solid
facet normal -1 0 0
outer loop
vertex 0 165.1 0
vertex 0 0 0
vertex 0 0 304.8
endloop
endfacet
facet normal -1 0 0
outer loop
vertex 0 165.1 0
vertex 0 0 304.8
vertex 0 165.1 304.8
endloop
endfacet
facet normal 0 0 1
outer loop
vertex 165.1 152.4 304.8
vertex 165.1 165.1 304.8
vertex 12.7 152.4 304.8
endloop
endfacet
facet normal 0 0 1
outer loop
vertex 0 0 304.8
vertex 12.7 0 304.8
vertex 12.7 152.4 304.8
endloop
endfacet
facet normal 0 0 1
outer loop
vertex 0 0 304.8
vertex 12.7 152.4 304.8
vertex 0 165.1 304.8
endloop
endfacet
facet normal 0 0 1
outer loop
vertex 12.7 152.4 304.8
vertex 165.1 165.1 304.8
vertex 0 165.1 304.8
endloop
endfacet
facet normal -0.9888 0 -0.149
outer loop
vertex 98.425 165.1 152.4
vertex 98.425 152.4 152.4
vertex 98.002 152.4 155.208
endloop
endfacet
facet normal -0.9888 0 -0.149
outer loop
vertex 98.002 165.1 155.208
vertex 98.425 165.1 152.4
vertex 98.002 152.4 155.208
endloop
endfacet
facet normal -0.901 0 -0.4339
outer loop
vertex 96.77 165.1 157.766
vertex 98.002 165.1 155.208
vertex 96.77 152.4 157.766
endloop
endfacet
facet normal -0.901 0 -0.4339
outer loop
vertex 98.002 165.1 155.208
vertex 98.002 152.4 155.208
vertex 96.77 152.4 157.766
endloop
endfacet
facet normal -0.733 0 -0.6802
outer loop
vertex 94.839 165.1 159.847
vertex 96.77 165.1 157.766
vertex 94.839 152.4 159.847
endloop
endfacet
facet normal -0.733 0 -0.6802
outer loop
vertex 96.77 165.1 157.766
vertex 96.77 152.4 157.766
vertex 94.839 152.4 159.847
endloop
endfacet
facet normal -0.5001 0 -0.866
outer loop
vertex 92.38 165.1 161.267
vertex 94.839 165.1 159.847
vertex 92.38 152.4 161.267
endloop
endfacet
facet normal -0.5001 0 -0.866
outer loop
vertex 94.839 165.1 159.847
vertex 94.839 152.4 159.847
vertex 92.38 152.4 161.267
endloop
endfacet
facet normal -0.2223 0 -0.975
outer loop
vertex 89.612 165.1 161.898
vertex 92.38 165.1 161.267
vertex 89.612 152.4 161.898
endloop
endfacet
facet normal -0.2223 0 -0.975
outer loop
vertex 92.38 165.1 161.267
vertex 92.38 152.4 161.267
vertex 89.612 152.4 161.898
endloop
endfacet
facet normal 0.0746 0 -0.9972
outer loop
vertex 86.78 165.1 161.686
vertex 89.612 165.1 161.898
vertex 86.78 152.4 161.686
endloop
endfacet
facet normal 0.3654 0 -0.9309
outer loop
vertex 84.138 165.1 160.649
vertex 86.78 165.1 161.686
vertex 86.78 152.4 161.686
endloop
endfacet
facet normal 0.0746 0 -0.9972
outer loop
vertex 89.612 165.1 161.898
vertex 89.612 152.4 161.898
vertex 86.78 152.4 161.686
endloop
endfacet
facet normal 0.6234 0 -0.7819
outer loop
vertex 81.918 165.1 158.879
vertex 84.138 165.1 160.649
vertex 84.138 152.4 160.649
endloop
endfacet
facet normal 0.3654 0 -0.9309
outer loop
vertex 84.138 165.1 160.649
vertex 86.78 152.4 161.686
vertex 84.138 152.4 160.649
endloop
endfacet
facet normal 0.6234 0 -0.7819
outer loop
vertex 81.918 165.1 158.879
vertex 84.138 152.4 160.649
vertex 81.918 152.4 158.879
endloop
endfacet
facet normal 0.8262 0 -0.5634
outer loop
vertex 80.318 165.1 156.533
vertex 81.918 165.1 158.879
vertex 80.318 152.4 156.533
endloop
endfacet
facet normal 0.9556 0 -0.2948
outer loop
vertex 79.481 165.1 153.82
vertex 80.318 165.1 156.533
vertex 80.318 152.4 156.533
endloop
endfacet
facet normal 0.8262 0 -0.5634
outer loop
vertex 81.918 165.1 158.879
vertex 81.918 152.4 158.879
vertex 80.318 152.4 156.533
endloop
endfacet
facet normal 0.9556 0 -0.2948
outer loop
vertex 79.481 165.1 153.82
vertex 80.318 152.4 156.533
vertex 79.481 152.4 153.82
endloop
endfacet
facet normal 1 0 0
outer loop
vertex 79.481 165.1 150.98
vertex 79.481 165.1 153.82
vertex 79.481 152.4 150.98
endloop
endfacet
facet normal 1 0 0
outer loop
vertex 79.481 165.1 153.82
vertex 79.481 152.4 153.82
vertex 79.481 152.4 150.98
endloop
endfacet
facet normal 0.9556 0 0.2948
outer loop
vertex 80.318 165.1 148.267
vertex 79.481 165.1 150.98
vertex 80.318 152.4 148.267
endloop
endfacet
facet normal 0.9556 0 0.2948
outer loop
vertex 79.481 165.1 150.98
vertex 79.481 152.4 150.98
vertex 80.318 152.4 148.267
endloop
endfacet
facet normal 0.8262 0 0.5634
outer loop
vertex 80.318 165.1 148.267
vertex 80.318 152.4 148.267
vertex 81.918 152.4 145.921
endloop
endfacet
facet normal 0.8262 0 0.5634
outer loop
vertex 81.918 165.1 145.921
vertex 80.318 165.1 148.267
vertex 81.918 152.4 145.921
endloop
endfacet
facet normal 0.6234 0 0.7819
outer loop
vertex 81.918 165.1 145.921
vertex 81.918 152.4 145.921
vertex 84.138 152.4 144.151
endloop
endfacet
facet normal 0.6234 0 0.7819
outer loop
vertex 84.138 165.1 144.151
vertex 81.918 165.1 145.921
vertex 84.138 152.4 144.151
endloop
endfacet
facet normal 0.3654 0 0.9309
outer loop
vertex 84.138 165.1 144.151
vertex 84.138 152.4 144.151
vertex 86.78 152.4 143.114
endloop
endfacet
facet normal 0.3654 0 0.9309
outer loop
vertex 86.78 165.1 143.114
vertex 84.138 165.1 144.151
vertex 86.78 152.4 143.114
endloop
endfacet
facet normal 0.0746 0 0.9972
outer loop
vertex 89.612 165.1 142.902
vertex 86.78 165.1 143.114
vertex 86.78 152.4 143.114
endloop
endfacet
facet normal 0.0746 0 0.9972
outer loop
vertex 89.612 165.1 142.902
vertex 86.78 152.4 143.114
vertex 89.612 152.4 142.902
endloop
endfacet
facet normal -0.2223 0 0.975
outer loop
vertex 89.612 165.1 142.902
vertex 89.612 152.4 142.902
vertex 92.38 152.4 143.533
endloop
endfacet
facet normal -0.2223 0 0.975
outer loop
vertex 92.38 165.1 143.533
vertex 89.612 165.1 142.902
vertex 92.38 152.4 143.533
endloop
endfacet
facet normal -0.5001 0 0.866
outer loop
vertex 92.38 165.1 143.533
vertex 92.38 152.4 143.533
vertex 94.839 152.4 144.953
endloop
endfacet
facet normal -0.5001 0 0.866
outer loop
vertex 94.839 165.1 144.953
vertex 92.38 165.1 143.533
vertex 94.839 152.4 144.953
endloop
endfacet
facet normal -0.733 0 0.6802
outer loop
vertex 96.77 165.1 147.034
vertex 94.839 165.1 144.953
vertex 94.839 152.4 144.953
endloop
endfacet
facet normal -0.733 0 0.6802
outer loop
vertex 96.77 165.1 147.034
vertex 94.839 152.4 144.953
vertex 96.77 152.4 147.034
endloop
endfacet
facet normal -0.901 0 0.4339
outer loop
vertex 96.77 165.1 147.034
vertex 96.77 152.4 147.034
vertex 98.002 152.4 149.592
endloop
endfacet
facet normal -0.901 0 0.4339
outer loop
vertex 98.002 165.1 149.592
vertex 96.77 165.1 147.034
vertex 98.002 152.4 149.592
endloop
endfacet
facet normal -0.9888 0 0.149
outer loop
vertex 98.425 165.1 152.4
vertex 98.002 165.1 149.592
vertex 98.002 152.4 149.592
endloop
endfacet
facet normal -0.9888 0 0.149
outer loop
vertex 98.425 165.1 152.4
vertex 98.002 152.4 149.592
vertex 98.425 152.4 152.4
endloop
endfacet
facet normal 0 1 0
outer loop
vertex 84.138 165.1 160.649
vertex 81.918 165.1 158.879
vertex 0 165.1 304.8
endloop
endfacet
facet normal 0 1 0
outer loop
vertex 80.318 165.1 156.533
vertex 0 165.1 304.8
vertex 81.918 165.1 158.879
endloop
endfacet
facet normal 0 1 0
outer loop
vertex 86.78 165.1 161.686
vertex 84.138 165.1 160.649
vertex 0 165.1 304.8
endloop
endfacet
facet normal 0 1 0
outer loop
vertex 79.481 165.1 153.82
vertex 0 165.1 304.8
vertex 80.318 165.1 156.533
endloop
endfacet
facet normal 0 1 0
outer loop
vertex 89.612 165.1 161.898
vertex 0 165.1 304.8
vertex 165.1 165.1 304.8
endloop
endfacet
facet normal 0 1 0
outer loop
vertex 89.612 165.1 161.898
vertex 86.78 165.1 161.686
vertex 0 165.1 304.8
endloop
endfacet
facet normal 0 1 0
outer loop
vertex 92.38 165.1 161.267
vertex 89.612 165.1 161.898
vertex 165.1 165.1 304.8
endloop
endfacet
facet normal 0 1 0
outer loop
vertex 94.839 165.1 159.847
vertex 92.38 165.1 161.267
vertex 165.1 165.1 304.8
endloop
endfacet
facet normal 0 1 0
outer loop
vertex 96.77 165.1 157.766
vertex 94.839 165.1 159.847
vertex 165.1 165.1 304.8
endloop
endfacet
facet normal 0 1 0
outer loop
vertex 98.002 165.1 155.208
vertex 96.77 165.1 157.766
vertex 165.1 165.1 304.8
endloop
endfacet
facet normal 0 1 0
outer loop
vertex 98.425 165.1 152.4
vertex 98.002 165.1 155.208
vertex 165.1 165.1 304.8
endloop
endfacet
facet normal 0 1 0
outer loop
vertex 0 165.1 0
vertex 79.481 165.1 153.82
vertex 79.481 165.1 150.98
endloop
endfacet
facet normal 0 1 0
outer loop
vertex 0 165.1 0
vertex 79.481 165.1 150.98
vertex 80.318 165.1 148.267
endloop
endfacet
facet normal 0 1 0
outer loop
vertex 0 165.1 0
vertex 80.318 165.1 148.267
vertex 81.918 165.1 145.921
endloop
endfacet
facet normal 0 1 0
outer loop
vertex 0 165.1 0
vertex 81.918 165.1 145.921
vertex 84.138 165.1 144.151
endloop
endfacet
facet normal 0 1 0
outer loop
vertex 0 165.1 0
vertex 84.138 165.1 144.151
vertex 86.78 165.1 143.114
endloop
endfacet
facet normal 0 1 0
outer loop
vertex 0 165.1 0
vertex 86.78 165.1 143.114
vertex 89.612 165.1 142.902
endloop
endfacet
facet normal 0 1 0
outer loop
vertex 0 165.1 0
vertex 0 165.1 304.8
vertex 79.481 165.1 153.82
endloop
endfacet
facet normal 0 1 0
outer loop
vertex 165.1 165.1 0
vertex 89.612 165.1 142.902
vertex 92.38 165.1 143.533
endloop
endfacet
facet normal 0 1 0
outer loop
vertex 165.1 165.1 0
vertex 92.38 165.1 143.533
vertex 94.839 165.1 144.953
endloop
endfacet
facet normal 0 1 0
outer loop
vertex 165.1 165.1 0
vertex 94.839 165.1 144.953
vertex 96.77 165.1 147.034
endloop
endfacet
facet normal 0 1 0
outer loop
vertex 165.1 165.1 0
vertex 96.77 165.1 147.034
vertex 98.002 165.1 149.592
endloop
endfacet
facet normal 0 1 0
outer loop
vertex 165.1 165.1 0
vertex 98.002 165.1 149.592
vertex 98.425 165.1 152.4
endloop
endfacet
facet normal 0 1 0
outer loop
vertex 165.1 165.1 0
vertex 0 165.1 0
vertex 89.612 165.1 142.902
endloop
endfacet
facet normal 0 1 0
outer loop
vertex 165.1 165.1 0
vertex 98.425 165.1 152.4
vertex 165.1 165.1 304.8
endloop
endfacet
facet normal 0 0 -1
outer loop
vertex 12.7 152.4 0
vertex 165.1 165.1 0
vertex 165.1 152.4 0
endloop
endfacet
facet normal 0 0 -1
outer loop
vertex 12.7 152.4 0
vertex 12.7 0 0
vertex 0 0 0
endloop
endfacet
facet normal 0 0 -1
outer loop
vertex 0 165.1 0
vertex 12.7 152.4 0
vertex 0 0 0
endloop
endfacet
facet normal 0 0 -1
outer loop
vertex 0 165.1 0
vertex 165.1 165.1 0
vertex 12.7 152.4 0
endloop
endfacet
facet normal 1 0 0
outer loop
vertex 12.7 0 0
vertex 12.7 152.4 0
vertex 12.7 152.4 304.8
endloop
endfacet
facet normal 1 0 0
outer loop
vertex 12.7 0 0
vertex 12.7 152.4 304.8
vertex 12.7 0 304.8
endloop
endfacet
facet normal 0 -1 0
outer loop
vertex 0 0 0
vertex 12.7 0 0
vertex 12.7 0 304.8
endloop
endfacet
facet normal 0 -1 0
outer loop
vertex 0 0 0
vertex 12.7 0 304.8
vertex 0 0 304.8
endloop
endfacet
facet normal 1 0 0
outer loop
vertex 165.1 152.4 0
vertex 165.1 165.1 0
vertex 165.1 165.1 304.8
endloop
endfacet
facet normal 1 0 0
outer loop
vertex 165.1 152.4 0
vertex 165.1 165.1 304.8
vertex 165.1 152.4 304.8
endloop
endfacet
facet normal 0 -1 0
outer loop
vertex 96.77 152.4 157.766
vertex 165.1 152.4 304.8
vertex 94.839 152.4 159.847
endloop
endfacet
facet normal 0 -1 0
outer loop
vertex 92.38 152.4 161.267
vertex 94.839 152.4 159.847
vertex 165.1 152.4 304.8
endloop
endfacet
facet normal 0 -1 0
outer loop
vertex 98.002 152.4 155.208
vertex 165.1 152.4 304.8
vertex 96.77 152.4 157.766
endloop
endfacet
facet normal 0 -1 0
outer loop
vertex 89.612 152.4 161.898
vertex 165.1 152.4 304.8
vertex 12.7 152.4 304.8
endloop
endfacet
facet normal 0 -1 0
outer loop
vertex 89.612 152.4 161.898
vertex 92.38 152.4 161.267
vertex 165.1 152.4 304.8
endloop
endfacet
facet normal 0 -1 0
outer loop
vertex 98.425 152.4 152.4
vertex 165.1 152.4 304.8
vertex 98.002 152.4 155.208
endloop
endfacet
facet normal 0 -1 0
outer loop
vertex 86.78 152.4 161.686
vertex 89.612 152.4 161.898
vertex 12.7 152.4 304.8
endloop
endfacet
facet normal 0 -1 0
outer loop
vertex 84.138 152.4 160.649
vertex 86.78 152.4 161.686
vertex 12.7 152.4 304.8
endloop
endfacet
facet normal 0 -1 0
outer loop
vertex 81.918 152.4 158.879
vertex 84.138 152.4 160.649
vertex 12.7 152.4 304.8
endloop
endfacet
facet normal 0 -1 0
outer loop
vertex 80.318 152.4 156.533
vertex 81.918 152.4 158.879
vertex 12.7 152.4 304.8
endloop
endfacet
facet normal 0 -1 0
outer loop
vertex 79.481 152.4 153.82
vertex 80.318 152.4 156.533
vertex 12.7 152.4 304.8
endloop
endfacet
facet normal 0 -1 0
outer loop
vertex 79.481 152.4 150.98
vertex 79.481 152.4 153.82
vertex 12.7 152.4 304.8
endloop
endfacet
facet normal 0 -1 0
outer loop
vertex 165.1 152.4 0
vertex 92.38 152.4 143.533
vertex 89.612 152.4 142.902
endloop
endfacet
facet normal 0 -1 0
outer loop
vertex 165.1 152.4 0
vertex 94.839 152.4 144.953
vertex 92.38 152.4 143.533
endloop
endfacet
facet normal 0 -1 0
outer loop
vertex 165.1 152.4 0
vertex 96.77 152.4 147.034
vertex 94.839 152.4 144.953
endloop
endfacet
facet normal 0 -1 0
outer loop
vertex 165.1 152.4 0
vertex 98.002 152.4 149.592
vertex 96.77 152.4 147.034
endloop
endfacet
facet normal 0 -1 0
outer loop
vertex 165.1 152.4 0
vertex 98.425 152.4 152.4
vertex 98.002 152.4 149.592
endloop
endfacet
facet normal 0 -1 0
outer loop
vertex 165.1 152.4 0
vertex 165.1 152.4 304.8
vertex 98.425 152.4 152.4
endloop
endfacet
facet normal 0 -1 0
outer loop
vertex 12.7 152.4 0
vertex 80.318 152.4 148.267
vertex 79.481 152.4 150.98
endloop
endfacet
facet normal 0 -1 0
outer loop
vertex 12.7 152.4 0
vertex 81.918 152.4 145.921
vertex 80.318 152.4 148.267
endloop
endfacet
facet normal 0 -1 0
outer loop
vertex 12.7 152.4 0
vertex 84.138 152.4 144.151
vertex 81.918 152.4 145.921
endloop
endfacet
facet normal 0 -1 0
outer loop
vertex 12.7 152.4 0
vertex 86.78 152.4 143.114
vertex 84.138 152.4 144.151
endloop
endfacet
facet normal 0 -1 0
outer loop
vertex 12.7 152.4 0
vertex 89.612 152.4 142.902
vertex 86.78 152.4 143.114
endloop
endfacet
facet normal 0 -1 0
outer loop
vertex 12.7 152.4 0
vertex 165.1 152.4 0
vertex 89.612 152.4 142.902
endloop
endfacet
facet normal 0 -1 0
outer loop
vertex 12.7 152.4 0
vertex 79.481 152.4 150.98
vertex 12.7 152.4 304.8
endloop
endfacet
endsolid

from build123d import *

# Parameters (mm, degrees)
BOSS_EXTRUDE1_DEPTH = 304.8
SKETCH2_R           = 9.525
CUT_EXTRUDE1_DEPTH  = 379.664508503


with BuildPart() as part:
    # Sketch1 → Boss-Extrude1 (new body)
    with BuildSketch(Plane.XY):
        Polygon((0, 0), (0, 165.1), (165.1, 165.1), (165.1, 152.4), (12.7, 152.4), (12.7, 0), align=None)
    extrude(amount=BOSS_EXTRUDE1_DEPTH)

    # Sketch2 → Cut-Extrude1 (cut, through all)
    with BuildSketch(Plane.XZ.offset(-152.4)):
        with Locations((88.9, 152.4)):
            Circle(SKETCH2_R)
    extrude(amount=-CUT_EXTRUDE1_DEPTH, mode=Mode.SUBTRACT)


solid = part.part
